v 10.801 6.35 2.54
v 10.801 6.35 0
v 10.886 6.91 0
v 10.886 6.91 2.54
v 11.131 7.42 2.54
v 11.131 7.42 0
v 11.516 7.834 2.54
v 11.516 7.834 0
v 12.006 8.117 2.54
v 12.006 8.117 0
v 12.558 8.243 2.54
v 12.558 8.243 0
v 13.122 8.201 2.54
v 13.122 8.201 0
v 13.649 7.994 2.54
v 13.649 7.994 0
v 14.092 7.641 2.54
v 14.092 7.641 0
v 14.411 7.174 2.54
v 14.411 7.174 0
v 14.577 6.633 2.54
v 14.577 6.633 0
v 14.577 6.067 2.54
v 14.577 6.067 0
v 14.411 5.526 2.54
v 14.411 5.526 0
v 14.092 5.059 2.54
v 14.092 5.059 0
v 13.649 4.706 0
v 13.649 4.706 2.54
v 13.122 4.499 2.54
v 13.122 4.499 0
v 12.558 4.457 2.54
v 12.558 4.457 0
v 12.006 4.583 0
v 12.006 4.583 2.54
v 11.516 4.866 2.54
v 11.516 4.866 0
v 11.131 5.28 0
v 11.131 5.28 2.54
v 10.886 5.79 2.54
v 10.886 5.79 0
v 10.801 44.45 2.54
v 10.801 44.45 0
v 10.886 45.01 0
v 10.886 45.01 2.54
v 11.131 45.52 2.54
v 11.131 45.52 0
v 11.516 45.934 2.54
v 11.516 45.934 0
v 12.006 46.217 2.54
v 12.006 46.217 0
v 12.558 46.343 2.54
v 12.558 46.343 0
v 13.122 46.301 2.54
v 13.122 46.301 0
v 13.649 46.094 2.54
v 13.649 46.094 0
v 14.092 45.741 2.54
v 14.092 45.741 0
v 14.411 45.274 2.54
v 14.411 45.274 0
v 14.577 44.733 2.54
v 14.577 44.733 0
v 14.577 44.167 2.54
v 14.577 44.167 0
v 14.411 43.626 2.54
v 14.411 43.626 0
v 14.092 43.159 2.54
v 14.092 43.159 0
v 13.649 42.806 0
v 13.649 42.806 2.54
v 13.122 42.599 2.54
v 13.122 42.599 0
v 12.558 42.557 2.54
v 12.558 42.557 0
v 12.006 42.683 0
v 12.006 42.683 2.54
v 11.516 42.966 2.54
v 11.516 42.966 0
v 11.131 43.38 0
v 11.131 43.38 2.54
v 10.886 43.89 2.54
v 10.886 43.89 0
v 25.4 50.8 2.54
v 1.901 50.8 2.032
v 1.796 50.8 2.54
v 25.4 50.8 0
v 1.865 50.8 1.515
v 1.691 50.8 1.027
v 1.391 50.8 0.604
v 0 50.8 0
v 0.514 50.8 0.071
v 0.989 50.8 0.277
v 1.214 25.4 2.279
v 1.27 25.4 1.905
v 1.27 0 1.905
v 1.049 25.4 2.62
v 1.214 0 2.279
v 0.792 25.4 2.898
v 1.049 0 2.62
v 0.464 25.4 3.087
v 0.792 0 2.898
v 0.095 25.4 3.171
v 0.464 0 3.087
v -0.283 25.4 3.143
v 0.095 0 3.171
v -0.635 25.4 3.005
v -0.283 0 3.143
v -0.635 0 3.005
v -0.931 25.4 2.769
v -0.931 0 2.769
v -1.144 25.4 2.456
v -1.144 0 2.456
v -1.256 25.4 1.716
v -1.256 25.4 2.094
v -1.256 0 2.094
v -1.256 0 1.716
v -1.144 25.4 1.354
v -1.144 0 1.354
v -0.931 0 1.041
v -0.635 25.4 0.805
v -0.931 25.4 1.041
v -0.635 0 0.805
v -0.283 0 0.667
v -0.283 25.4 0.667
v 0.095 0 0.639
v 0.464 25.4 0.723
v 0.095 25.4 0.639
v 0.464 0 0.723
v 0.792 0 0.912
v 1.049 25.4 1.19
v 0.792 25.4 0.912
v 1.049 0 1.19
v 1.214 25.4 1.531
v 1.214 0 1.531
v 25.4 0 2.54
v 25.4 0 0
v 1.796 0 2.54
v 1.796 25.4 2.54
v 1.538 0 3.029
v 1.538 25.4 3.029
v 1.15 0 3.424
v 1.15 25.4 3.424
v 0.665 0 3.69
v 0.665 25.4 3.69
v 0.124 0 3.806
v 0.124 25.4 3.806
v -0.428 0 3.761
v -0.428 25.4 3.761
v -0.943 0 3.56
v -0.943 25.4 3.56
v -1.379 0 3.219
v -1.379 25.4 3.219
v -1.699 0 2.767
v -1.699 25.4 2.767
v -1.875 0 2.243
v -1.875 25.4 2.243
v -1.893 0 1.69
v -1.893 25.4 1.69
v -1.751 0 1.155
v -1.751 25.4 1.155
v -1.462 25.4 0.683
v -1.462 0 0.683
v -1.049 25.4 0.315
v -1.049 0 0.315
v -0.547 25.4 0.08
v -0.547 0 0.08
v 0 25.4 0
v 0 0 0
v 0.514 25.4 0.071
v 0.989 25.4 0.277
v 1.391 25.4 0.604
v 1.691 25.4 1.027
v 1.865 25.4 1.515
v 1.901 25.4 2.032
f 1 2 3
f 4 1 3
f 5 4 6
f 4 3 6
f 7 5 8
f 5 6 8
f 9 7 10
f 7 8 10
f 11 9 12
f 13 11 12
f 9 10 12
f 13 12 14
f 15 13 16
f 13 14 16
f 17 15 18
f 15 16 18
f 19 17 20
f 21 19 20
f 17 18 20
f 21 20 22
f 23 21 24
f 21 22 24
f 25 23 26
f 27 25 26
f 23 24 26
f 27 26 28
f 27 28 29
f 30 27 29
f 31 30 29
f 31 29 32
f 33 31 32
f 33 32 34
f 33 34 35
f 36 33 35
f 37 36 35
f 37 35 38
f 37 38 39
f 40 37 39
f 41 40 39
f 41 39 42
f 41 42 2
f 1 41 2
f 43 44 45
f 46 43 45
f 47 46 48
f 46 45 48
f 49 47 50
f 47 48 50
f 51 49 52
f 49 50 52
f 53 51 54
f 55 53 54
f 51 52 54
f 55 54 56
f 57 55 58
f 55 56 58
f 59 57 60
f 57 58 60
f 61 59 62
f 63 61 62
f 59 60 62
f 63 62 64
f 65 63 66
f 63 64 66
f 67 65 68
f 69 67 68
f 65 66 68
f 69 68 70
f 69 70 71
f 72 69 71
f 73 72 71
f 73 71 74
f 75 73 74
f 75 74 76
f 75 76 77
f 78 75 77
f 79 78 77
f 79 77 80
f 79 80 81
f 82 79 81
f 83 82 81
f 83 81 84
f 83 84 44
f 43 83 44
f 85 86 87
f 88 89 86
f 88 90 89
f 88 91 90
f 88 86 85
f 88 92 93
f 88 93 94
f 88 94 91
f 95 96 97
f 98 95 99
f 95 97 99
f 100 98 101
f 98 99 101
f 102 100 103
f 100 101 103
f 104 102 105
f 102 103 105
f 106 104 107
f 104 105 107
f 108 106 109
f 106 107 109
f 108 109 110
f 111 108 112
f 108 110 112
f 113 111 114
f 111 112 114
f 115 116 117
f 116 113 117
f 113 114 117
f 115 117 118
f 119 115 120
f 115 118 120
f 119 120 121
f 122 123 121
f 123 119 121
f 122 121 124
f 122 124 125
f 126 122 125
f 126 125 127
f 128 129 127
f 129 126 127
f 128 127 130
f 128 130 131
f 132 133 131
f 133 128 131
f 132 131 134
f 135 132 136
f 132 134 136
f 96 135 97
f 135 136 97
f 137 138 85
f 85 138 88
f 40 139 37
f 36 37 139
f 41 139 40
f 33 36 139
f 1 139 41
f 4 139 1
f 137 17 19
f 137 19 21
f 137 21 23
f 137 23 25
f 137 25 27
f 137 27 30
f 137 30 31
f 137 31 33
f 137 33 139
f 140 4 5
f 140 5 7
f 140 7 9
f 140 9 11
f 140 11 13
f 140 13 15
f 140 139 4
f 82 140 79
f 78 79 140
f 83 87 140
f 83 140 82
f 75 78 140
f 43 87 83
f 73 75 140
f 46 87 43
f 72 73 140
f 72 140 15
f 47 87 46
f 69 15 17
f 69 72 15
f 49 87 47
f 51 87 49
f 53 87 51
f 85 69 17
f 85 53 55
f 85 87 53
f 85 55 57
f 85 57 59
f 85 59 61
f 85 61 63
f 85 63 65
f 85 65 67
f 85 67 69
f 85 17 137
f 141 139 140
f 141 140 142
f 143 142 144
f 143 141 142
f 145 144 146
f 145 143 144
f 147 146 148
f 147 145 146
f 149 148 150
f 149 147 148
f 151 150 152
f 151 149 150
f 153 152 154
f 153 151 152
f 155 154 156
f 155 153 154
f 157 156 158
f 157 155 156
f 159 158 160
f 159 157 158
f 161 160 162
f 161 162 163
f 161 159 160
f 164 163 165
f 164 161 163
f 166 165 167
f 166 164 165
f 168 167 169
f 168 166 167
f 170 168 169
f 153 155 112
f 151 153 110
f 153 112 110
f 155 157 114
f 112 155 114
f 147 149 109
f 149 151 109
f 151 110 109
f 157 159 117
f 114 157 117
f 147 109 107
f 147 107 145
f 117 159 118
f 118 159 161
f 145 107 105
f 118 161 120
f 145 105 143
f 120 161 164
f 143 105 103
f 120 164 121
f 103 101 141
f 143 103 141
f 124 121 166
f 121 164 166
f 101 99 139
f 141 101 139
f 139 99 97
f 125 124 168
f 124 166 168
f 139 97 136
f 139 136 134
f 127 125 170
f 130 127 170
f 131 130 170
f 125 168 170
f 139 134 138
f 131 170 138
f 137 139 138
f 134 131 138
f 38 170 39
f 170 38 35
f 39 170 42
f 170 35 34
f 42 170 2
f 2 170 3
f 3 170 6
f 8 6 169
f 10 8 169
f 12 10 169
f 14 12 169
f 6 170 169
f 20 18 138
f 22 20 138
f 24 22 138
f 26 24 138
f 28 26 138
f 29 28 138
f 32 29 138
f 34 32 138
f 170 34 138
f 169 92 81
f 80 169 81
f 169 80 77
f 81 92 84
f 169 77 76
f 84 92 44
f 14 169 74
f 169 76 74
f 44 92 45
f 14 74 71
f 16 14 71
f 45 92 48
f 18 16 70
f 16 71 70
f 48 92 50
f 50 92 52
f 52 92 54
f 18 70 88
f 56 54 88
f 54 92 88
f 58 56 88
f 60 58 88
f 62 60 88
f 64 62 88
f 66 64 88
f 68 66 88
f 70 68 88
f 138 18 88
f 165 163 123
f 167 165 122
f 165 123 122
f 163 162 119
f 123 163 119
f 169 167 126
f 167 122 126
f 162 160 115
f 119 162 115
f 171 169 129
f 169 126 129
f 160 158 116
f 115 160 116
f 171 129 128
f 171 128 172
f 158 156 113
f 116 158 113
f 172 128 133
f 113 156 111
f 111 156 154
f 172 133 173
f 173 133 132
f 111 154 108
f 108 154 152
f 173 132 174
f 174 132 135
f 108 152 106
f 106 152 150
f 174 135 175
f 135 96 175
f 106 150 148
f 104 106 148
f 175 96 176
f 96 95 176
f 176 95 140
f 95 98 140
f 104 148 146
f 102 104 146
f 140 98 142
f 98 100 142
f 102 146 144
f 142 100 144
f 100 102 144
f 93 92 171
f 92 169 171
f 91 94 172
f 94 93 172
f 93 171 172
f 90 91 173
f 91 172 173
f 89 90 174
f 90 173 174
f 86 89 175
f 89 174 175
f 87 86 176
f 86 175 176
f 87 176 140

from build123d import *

# Parameters (mm, degrees)
F0_W     = 25.4
F0_H     = 50.8
F1_DEPTH = 2.54
F3_D     = 3.7973
F4_R     = 1.905
F5_DEPTH = 25.4
F6_R     = 1.27
F7_DEPTH = 25.4
F8_START = -25.4
F8_DEPTH = 25.4


with BuildPart() as f1:
    # F0 (on Top) → F1 (new body)
    with BuildSketch(Plane.XY):
        with Locations((12.7, 25.4)):
            Rectangle(F0_W, F0_H)
    extrude(amount=F1_DEPTH)

    # F3 (through all)
    with Locations(Plane.XY.offset(2.54)):
        with Locations((12.7, 44.45), (12.7, 6.35)):
            Hole(F3_D / 2)

    # F4 (on face) → F5 (join)
    with BuildSketch(Plane.XZ):
        with Locations((0, 1.905)):
            Circle(F4_R)
    extrude(amount=-F5_DEPTH)

    # F6 (on face) → F7 (cut, through all)
    with BuildSketch(Plane.XZ):
        with Locations((0, 1.905)):
            Circle(F6_R)
    extrude(amount=-F7_DEPTH, mode=Mode.SUBTRACT)

    # F4 (on face) → F8 (cut)
    with BuildSketch(Plane.XZ.offset(F8_START)):
        with Locations((0, 1.905)):
            Circle(F4_R)
    extrude(amount=-F8_DEPTH, mode=Mode.SUBTRACT)


solid = f1.part
